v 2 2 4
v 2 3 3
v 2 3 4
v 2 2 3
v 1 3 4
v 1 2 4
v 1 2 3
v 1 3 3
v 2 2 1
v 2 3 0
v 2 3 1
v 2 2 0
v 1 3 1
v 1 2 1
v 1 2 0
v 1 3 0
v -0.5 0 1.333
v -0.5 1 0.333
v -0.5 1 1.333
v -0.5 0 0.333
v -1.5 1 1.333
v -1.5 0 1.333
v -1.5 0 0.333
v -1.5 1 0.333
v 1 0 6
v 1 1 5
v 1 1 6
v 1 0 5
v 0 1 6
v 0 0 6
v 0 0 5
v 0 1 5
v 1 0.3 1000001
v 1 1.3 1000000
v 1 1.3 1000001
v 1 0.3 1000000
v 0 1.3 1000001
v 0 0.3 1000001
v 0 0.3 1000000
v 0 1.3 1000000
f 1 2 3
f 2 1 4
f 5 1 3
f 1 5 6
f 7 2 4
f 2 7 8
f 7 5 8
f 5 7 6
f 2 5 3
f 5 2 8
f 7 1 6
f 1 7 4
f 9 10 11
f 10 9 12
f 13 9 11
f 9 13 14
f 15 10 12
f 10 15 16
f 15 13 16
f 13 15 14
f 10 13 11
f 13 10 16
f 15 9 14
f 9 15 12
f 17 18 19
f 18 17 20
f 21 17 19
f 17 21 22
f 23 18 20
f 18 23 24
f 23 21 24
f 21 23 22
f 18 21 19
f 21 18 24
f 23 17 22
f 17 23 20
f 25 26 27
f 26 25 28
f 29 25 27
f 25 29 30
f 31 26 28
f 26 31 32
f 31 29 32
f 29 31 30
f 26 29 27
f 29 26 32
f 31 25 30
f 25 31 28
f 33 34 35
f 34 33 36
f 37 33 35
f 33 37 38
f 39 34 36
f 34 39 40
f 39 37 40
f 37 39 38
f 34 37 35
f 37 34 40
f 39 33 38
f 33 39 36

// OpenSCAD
translate([1, 2, 3]) cube();
translate([1, 2]) cube();
translate([-1.5, 0, 1/3]) cube();
translate(v = [0, 0, 5]) cube();
translate([1e-20, 0.1 + 0.2, 1e6]) cube();
